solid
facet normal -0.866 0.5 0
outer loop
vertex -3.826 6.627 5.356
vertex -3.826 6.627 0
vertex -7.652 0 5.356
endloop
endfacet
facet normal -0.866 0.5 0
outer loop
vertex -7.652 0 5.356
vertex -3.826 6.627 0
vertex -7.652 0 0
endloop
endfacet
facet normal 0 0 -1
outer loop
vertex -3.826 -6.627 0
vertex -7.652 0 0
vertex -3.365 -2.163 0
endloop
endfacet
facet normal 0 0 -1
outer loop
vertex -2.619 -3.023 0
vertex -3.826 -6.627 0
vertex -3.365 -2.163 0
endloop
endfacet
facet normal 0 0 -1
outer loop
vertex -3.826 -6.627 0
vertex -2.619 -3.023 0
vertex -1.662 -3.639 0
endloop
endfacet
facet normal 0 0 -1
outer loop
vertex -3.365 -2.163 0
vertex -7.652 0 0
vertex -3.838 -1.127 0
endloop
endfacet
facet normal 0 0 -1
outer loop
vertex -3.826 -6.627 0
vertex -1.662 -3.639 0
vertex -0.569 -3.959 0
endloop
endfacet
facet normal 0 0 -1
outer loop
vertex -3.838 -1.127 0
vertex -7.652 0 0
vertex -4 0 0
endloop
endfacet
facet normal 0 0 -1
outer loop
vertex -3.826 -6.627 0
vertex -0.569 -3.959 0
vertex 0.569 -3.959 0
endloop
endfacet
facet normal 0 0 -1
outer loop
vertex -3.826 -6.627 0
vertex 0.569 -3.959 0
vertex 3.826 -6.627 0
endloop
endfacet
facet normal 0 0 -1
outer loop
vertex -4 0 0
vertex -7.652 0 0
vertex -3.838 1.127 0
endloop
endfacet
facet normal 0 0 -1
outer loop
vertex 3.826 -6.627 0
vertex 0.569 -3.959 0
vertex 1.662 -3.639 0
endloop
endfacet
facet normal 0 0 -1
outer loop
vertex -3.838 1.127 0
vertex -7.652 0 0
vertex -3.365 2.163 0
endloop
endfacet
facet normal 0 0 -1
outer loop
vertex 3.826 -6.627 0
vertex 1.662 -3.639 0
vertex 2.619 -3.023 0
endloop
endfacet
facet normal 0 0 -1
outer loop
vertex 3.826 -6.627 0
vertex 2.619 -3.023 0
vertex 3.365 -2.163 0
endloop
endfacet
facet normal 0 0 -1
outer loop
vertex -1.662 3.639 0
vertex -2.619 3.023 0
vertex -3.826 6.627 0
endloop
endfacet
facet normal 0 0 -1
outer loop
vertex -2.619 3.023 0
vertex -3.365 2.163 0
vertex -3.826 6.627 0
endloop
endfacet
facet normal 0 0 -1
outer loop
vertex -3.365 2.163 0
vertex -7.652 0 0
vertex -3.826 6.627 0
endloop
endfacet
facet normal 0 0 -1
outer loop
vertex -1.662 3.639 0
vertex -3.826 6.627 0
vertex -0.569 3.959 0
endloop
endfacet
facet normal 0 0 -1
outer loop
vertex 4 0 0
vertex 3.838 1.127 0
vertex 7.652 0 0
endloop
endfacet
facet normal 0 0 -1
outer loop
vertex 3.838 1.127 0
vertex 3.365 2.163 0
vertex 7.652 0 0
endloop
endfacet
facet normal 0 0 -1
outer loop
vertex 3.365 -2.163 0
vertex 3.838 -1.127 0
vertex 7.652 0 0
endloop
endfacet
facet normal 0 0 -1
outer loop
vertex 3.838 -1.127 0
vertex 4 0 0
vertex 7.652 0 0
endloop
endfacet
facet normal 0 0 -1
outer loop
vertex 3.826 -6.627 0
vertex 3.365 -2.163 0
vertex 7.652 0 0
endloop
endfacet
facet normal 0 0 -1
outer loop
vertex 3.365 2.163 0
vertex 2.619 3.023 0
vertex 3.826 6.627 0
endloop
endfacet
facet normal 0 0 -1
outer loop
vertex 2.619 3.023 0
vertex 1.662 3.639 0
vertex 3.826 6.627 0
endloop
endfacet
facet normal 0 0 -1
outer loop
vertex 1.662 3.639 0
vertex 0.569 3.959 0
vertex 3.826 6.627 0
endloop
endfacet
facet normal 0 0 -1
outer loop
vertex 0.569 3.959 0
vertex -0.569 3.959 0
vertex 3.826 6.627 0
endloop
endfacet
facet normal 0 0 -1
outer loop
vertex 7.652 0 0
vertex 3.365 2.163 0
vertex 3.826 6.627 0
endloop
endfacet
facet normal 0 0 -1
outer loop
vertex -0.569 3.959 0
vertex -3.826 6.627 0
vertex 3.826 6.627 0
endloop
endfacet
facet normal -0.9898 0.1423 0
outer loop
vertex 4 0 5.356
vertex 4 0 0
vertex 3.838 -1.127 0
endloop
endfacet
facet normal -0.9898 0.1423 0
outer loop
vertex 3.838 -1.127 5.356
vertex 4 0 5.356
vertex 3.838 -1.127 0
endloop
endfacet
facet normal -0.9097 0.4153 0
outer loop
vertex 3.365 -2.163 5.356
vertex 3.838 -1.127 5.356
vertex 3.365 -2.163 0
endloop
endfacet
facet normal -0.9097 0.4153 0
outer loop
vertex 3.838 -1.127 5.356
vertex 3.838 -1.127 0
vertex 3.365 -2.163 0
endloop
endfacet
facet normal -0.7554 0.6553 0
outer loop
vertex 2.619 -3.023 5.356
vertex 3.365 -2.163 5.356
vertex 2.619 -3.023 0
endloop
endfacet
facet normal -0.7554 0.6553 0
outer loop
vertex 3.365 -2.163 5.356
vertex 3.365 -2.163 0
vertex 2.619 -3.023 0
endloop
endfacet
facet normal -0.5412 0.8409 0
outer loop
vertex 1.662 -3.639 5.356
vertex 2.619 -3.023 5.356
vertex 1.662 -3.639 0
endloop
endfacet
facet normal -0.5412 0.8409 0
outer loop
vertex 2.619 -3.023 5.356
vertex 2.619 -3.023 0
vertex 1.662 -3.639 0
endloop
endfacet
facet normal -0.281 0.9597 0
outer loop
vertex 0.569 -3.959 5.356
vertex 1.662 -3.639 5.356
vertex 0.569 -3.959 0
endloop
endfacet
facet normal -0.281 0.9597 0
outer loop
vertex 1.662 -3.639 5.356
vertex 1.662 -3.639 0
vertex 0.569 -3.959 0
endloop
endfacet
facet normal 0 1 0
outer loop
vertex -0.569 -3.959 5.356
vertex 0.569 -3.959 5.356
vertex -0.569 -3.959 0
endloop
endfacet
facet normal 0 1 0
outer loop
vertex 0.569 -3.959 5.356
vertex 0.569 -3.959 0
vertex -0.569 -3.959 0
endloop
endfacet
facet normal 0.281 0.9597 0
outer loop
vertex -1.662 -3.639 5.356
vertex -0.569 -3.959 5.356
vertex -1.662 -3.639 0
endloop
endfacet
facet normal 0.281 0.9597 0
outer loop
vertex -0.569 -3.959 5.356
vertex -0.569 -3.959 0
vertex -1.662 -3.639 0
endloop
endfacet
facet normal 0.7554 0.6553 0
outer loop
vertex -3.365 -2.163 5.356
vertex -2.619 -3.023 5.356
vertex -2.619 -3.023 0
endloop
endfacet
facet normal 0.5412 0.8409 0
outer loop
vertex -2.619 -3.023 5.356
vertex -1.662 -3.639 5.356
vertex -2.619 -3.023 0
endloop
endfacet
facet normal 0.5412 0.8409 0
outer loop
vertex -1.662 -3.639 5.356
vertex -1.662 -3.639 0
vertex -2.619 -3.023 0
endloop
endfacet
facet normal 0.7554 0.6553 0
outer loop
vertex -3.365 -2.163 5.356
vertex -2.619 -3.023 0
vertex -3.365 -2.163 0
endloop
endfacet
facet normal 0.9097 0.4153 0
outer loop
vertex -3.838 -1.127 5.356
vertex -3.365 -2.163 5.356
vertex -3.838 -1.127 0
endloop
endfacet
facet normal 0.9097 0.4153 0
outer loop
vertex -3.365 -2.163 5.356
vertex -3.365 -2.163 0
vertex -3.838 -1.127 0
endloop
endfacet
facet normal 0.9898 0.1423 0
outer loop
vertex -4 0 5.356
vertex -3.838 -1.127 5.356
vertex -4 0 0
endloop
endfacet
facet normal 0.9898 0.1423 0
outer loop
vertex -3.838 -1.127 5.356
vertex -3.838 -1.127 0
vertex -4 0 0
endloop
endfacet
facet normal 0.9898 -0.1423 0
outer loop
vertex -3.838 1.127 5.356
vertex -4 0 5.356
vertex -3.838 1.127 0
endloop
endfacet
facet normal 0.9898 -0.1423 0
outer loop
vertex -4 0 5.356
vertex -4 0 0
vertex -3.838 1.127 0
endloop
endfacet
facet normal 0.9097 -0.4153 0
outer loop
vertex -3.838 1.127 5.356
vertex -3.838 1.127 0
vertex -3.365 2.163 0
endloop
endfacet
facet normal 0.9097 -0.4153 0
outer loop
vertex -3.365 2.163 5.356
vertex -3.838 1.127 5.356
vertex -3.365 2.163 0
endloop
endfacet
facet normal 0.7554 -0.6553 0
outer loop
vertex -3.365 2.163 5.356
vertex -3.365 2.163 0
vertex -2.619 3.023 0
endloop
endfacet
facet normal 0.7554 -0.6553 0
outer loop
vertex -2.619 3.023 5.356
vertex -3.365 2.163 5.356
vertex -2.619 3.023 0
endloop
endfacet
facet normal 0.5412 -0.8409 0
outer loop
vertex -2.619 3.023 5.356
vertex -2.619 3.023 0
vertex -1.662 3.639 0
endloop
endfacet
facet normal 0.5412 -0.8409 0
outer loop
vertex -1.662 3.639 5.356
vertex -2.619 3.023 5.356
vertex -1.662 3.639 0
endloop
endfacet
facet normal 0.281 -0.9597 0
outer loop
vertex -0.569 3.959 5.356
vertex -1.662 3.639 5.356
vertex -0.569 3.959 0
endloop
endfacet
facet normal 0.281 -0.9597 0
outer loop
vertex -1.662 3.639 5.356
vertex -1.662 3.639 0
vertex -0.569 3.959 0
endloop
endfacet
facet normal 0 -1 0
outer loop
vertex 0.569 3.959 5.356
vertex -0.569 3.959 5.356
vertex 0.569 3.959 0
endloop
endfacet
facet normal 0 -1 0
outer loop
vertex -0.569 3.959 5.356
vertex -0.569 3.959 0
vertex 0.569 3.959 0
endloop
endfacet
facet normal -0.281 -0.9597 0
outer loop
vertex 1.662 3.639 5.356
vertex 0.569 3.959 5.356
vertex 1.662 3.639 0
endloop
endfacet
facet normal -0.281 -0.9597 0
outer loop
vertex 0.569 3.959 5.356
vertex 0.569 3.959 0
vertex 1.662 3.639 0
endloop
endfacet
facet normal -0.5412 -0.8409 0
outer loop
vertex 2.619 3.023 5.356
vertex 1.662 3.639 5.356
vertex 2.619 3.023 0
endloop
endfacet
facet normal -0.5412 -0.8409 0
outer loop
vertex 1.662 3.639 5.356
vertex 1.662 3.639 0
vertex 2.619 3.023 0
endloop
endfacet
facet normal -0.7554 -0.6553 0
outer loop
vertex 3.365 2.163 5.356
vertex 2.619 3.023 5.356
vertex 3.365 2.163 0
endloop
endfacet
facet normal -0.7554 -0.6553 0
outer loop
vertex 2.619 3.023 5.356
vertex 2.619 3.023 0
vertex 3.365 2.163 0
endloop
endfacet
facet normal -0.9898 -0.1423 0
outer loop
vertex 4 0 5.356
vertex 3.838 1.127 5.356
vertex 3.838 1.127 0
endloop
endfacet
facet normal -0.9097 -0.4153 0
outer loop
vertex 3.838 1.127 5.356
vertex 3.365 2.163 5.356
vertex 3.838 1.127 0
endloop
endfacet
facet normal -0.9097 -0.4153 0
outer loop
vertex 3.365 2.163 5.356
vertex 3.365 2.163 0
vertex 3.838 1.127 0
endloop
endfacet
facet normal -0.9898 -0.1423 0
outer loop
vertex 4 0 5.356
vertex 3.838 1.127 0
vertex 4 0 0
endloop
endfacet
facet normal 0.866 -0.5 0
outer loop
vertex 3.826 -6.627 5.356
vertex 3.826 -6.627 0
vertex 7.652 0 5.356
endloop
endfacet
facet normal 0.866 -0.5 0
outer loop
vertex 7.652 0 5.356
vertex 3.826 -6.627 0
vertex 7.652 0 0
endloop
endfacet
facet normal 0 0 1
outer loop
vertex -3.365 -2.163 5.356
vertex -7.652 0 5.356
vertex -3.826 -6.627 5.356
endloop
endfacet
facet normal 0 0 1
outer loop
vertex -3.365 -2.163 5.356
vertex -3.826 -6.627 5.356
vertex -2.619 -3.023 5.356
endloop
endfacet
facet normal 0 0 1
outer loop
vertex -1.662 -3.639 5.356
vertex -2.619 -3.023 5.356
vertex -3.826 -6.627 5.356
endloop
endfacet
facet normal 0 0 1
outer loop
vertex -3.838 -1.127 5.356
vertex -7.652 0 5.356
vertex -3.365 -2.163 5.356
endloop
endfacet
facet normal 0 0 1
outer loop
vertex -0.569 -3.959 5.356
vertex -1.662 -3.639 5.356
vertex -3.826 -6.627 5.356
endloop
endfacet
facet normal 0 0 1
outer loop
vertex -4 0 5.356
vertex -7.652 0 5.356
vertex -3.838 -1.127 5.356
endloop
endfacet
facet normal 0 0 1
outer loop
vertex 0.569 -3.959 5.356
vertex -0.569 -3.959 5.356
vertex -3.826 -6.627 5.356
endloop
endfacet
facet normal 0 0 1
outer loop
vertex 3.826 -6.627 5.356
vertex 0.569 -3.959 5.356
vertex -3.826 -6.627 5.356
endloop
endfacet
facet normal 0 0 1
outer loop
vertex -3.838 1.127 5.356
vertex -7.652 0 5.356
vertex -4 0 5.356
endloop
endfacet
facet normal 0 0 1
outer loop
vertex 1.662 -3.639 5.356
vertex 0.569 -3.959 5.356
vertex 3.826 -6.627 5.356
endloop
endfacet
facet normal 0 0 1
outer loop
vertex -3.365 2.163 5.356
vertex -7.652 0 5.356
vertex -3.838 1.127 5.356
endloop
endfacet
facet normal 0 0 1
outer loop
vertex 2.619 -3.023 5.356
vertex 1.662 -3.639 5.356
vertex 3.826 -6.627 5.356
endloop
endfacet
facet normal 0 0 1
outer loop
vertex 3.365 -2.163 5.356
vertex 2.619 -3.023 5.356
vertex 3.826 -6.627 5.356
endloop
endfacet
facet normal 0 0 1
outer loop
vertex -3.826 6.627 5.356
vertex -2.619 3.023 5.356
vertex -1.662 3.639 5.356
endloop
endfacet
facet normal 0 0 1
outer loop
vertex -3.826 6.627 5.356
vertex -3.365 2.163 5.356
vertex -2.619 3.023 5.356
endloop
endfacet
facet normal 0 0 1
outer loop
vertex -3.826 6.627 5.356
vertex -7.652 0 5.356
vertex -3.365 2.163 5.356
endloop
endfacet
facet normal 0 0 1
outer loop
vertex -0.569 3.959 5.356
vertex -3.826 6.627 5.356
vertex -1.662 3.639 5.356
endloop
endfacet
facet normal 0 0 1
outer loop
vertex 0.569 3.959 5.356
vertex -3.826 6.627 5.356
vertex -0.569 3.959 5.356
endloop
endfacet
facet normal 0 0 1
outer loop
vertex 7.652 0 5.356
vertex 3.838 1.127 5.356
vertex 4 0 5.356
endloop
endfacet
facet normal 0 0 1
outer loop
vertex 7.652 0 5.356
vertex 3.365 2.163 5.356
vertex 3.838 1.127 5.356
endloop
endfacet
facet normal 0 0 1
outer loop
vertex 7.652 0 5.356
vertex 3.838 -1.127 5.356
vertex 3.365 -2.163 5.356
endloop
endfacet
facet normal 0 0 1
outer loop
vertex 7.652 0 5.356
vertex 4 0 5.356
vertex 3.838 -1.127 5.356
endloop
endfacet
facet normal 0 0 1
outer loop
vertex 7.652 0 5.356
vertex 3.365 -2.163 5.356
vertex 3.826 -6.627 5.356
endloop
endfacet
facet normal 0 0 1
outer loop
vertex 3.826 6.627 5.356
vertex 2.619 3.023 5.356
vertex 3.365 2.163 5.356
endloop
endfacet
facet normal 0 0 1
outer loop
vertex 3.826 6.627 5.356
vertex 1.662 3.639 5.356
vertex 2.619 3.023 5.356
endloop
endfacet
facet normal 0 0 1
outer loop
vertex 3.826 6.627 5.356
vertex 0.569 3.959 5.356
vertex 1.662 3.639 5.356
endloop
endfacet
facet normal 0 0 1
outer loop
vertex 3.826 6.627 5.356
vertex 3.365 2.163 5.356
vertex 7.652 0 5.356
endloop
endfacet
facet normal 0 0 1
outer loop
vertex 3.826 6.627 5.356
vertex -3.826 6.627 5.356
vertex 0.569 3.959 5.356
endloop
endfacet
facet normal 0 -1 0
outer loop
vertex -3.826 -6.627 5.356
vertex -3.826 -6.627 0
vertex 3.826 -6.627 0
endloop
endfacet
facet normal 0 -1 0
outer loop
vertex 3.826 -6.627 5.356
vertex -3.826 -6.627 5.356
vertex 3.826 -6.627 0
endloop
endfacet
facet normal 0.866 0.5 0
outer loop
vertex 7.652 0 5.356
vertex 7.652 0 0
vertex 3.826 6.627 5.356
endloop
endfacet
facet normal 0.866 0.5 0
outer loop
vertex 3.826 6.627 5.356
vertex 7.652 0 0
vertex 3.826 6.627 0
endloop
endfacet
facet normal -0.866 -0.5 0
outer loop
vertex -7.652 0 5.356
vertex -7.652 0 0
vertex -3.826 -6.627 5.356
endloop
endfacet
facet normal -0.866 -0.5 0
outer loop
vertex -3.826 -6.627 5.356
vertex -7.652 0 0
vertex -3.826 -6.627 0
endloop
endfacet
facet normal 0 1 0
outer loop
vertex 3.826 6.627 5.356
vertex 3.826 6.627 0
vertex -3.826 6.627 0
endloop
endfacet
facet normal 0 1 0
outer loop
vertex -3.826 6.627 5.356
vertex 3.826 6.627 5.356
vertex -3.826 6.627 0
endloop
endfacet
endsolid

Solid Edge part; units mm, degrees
sketch "Sketch1" plane through (0, 0, 0) normal (0, 0, 1) x (1, 0, 0)
  circle A0 centre (0, 0) radius 4
  line L0 (-3.826, 6.6268) -> (-7.652, 0)
  line L1 (-7.652, 0) -> (-3.826, -6.6268)
  line L2 (-3.826, -6.6268) -> (3.826, -6.6268)
  line L3 (3.826, -6.6268) -> (7.652, 0)
  line L4 (7.652, 0) -> (3.826, 6.6268)
  line L5 (3.826, 6.6268) -> (-3.826, 6.6268)
extrude "Protrusion1" add sketch "Sketch1" along normal blind 5.356
cosmetic_thread "Thread1" size "M8"
properties material "Steel"
